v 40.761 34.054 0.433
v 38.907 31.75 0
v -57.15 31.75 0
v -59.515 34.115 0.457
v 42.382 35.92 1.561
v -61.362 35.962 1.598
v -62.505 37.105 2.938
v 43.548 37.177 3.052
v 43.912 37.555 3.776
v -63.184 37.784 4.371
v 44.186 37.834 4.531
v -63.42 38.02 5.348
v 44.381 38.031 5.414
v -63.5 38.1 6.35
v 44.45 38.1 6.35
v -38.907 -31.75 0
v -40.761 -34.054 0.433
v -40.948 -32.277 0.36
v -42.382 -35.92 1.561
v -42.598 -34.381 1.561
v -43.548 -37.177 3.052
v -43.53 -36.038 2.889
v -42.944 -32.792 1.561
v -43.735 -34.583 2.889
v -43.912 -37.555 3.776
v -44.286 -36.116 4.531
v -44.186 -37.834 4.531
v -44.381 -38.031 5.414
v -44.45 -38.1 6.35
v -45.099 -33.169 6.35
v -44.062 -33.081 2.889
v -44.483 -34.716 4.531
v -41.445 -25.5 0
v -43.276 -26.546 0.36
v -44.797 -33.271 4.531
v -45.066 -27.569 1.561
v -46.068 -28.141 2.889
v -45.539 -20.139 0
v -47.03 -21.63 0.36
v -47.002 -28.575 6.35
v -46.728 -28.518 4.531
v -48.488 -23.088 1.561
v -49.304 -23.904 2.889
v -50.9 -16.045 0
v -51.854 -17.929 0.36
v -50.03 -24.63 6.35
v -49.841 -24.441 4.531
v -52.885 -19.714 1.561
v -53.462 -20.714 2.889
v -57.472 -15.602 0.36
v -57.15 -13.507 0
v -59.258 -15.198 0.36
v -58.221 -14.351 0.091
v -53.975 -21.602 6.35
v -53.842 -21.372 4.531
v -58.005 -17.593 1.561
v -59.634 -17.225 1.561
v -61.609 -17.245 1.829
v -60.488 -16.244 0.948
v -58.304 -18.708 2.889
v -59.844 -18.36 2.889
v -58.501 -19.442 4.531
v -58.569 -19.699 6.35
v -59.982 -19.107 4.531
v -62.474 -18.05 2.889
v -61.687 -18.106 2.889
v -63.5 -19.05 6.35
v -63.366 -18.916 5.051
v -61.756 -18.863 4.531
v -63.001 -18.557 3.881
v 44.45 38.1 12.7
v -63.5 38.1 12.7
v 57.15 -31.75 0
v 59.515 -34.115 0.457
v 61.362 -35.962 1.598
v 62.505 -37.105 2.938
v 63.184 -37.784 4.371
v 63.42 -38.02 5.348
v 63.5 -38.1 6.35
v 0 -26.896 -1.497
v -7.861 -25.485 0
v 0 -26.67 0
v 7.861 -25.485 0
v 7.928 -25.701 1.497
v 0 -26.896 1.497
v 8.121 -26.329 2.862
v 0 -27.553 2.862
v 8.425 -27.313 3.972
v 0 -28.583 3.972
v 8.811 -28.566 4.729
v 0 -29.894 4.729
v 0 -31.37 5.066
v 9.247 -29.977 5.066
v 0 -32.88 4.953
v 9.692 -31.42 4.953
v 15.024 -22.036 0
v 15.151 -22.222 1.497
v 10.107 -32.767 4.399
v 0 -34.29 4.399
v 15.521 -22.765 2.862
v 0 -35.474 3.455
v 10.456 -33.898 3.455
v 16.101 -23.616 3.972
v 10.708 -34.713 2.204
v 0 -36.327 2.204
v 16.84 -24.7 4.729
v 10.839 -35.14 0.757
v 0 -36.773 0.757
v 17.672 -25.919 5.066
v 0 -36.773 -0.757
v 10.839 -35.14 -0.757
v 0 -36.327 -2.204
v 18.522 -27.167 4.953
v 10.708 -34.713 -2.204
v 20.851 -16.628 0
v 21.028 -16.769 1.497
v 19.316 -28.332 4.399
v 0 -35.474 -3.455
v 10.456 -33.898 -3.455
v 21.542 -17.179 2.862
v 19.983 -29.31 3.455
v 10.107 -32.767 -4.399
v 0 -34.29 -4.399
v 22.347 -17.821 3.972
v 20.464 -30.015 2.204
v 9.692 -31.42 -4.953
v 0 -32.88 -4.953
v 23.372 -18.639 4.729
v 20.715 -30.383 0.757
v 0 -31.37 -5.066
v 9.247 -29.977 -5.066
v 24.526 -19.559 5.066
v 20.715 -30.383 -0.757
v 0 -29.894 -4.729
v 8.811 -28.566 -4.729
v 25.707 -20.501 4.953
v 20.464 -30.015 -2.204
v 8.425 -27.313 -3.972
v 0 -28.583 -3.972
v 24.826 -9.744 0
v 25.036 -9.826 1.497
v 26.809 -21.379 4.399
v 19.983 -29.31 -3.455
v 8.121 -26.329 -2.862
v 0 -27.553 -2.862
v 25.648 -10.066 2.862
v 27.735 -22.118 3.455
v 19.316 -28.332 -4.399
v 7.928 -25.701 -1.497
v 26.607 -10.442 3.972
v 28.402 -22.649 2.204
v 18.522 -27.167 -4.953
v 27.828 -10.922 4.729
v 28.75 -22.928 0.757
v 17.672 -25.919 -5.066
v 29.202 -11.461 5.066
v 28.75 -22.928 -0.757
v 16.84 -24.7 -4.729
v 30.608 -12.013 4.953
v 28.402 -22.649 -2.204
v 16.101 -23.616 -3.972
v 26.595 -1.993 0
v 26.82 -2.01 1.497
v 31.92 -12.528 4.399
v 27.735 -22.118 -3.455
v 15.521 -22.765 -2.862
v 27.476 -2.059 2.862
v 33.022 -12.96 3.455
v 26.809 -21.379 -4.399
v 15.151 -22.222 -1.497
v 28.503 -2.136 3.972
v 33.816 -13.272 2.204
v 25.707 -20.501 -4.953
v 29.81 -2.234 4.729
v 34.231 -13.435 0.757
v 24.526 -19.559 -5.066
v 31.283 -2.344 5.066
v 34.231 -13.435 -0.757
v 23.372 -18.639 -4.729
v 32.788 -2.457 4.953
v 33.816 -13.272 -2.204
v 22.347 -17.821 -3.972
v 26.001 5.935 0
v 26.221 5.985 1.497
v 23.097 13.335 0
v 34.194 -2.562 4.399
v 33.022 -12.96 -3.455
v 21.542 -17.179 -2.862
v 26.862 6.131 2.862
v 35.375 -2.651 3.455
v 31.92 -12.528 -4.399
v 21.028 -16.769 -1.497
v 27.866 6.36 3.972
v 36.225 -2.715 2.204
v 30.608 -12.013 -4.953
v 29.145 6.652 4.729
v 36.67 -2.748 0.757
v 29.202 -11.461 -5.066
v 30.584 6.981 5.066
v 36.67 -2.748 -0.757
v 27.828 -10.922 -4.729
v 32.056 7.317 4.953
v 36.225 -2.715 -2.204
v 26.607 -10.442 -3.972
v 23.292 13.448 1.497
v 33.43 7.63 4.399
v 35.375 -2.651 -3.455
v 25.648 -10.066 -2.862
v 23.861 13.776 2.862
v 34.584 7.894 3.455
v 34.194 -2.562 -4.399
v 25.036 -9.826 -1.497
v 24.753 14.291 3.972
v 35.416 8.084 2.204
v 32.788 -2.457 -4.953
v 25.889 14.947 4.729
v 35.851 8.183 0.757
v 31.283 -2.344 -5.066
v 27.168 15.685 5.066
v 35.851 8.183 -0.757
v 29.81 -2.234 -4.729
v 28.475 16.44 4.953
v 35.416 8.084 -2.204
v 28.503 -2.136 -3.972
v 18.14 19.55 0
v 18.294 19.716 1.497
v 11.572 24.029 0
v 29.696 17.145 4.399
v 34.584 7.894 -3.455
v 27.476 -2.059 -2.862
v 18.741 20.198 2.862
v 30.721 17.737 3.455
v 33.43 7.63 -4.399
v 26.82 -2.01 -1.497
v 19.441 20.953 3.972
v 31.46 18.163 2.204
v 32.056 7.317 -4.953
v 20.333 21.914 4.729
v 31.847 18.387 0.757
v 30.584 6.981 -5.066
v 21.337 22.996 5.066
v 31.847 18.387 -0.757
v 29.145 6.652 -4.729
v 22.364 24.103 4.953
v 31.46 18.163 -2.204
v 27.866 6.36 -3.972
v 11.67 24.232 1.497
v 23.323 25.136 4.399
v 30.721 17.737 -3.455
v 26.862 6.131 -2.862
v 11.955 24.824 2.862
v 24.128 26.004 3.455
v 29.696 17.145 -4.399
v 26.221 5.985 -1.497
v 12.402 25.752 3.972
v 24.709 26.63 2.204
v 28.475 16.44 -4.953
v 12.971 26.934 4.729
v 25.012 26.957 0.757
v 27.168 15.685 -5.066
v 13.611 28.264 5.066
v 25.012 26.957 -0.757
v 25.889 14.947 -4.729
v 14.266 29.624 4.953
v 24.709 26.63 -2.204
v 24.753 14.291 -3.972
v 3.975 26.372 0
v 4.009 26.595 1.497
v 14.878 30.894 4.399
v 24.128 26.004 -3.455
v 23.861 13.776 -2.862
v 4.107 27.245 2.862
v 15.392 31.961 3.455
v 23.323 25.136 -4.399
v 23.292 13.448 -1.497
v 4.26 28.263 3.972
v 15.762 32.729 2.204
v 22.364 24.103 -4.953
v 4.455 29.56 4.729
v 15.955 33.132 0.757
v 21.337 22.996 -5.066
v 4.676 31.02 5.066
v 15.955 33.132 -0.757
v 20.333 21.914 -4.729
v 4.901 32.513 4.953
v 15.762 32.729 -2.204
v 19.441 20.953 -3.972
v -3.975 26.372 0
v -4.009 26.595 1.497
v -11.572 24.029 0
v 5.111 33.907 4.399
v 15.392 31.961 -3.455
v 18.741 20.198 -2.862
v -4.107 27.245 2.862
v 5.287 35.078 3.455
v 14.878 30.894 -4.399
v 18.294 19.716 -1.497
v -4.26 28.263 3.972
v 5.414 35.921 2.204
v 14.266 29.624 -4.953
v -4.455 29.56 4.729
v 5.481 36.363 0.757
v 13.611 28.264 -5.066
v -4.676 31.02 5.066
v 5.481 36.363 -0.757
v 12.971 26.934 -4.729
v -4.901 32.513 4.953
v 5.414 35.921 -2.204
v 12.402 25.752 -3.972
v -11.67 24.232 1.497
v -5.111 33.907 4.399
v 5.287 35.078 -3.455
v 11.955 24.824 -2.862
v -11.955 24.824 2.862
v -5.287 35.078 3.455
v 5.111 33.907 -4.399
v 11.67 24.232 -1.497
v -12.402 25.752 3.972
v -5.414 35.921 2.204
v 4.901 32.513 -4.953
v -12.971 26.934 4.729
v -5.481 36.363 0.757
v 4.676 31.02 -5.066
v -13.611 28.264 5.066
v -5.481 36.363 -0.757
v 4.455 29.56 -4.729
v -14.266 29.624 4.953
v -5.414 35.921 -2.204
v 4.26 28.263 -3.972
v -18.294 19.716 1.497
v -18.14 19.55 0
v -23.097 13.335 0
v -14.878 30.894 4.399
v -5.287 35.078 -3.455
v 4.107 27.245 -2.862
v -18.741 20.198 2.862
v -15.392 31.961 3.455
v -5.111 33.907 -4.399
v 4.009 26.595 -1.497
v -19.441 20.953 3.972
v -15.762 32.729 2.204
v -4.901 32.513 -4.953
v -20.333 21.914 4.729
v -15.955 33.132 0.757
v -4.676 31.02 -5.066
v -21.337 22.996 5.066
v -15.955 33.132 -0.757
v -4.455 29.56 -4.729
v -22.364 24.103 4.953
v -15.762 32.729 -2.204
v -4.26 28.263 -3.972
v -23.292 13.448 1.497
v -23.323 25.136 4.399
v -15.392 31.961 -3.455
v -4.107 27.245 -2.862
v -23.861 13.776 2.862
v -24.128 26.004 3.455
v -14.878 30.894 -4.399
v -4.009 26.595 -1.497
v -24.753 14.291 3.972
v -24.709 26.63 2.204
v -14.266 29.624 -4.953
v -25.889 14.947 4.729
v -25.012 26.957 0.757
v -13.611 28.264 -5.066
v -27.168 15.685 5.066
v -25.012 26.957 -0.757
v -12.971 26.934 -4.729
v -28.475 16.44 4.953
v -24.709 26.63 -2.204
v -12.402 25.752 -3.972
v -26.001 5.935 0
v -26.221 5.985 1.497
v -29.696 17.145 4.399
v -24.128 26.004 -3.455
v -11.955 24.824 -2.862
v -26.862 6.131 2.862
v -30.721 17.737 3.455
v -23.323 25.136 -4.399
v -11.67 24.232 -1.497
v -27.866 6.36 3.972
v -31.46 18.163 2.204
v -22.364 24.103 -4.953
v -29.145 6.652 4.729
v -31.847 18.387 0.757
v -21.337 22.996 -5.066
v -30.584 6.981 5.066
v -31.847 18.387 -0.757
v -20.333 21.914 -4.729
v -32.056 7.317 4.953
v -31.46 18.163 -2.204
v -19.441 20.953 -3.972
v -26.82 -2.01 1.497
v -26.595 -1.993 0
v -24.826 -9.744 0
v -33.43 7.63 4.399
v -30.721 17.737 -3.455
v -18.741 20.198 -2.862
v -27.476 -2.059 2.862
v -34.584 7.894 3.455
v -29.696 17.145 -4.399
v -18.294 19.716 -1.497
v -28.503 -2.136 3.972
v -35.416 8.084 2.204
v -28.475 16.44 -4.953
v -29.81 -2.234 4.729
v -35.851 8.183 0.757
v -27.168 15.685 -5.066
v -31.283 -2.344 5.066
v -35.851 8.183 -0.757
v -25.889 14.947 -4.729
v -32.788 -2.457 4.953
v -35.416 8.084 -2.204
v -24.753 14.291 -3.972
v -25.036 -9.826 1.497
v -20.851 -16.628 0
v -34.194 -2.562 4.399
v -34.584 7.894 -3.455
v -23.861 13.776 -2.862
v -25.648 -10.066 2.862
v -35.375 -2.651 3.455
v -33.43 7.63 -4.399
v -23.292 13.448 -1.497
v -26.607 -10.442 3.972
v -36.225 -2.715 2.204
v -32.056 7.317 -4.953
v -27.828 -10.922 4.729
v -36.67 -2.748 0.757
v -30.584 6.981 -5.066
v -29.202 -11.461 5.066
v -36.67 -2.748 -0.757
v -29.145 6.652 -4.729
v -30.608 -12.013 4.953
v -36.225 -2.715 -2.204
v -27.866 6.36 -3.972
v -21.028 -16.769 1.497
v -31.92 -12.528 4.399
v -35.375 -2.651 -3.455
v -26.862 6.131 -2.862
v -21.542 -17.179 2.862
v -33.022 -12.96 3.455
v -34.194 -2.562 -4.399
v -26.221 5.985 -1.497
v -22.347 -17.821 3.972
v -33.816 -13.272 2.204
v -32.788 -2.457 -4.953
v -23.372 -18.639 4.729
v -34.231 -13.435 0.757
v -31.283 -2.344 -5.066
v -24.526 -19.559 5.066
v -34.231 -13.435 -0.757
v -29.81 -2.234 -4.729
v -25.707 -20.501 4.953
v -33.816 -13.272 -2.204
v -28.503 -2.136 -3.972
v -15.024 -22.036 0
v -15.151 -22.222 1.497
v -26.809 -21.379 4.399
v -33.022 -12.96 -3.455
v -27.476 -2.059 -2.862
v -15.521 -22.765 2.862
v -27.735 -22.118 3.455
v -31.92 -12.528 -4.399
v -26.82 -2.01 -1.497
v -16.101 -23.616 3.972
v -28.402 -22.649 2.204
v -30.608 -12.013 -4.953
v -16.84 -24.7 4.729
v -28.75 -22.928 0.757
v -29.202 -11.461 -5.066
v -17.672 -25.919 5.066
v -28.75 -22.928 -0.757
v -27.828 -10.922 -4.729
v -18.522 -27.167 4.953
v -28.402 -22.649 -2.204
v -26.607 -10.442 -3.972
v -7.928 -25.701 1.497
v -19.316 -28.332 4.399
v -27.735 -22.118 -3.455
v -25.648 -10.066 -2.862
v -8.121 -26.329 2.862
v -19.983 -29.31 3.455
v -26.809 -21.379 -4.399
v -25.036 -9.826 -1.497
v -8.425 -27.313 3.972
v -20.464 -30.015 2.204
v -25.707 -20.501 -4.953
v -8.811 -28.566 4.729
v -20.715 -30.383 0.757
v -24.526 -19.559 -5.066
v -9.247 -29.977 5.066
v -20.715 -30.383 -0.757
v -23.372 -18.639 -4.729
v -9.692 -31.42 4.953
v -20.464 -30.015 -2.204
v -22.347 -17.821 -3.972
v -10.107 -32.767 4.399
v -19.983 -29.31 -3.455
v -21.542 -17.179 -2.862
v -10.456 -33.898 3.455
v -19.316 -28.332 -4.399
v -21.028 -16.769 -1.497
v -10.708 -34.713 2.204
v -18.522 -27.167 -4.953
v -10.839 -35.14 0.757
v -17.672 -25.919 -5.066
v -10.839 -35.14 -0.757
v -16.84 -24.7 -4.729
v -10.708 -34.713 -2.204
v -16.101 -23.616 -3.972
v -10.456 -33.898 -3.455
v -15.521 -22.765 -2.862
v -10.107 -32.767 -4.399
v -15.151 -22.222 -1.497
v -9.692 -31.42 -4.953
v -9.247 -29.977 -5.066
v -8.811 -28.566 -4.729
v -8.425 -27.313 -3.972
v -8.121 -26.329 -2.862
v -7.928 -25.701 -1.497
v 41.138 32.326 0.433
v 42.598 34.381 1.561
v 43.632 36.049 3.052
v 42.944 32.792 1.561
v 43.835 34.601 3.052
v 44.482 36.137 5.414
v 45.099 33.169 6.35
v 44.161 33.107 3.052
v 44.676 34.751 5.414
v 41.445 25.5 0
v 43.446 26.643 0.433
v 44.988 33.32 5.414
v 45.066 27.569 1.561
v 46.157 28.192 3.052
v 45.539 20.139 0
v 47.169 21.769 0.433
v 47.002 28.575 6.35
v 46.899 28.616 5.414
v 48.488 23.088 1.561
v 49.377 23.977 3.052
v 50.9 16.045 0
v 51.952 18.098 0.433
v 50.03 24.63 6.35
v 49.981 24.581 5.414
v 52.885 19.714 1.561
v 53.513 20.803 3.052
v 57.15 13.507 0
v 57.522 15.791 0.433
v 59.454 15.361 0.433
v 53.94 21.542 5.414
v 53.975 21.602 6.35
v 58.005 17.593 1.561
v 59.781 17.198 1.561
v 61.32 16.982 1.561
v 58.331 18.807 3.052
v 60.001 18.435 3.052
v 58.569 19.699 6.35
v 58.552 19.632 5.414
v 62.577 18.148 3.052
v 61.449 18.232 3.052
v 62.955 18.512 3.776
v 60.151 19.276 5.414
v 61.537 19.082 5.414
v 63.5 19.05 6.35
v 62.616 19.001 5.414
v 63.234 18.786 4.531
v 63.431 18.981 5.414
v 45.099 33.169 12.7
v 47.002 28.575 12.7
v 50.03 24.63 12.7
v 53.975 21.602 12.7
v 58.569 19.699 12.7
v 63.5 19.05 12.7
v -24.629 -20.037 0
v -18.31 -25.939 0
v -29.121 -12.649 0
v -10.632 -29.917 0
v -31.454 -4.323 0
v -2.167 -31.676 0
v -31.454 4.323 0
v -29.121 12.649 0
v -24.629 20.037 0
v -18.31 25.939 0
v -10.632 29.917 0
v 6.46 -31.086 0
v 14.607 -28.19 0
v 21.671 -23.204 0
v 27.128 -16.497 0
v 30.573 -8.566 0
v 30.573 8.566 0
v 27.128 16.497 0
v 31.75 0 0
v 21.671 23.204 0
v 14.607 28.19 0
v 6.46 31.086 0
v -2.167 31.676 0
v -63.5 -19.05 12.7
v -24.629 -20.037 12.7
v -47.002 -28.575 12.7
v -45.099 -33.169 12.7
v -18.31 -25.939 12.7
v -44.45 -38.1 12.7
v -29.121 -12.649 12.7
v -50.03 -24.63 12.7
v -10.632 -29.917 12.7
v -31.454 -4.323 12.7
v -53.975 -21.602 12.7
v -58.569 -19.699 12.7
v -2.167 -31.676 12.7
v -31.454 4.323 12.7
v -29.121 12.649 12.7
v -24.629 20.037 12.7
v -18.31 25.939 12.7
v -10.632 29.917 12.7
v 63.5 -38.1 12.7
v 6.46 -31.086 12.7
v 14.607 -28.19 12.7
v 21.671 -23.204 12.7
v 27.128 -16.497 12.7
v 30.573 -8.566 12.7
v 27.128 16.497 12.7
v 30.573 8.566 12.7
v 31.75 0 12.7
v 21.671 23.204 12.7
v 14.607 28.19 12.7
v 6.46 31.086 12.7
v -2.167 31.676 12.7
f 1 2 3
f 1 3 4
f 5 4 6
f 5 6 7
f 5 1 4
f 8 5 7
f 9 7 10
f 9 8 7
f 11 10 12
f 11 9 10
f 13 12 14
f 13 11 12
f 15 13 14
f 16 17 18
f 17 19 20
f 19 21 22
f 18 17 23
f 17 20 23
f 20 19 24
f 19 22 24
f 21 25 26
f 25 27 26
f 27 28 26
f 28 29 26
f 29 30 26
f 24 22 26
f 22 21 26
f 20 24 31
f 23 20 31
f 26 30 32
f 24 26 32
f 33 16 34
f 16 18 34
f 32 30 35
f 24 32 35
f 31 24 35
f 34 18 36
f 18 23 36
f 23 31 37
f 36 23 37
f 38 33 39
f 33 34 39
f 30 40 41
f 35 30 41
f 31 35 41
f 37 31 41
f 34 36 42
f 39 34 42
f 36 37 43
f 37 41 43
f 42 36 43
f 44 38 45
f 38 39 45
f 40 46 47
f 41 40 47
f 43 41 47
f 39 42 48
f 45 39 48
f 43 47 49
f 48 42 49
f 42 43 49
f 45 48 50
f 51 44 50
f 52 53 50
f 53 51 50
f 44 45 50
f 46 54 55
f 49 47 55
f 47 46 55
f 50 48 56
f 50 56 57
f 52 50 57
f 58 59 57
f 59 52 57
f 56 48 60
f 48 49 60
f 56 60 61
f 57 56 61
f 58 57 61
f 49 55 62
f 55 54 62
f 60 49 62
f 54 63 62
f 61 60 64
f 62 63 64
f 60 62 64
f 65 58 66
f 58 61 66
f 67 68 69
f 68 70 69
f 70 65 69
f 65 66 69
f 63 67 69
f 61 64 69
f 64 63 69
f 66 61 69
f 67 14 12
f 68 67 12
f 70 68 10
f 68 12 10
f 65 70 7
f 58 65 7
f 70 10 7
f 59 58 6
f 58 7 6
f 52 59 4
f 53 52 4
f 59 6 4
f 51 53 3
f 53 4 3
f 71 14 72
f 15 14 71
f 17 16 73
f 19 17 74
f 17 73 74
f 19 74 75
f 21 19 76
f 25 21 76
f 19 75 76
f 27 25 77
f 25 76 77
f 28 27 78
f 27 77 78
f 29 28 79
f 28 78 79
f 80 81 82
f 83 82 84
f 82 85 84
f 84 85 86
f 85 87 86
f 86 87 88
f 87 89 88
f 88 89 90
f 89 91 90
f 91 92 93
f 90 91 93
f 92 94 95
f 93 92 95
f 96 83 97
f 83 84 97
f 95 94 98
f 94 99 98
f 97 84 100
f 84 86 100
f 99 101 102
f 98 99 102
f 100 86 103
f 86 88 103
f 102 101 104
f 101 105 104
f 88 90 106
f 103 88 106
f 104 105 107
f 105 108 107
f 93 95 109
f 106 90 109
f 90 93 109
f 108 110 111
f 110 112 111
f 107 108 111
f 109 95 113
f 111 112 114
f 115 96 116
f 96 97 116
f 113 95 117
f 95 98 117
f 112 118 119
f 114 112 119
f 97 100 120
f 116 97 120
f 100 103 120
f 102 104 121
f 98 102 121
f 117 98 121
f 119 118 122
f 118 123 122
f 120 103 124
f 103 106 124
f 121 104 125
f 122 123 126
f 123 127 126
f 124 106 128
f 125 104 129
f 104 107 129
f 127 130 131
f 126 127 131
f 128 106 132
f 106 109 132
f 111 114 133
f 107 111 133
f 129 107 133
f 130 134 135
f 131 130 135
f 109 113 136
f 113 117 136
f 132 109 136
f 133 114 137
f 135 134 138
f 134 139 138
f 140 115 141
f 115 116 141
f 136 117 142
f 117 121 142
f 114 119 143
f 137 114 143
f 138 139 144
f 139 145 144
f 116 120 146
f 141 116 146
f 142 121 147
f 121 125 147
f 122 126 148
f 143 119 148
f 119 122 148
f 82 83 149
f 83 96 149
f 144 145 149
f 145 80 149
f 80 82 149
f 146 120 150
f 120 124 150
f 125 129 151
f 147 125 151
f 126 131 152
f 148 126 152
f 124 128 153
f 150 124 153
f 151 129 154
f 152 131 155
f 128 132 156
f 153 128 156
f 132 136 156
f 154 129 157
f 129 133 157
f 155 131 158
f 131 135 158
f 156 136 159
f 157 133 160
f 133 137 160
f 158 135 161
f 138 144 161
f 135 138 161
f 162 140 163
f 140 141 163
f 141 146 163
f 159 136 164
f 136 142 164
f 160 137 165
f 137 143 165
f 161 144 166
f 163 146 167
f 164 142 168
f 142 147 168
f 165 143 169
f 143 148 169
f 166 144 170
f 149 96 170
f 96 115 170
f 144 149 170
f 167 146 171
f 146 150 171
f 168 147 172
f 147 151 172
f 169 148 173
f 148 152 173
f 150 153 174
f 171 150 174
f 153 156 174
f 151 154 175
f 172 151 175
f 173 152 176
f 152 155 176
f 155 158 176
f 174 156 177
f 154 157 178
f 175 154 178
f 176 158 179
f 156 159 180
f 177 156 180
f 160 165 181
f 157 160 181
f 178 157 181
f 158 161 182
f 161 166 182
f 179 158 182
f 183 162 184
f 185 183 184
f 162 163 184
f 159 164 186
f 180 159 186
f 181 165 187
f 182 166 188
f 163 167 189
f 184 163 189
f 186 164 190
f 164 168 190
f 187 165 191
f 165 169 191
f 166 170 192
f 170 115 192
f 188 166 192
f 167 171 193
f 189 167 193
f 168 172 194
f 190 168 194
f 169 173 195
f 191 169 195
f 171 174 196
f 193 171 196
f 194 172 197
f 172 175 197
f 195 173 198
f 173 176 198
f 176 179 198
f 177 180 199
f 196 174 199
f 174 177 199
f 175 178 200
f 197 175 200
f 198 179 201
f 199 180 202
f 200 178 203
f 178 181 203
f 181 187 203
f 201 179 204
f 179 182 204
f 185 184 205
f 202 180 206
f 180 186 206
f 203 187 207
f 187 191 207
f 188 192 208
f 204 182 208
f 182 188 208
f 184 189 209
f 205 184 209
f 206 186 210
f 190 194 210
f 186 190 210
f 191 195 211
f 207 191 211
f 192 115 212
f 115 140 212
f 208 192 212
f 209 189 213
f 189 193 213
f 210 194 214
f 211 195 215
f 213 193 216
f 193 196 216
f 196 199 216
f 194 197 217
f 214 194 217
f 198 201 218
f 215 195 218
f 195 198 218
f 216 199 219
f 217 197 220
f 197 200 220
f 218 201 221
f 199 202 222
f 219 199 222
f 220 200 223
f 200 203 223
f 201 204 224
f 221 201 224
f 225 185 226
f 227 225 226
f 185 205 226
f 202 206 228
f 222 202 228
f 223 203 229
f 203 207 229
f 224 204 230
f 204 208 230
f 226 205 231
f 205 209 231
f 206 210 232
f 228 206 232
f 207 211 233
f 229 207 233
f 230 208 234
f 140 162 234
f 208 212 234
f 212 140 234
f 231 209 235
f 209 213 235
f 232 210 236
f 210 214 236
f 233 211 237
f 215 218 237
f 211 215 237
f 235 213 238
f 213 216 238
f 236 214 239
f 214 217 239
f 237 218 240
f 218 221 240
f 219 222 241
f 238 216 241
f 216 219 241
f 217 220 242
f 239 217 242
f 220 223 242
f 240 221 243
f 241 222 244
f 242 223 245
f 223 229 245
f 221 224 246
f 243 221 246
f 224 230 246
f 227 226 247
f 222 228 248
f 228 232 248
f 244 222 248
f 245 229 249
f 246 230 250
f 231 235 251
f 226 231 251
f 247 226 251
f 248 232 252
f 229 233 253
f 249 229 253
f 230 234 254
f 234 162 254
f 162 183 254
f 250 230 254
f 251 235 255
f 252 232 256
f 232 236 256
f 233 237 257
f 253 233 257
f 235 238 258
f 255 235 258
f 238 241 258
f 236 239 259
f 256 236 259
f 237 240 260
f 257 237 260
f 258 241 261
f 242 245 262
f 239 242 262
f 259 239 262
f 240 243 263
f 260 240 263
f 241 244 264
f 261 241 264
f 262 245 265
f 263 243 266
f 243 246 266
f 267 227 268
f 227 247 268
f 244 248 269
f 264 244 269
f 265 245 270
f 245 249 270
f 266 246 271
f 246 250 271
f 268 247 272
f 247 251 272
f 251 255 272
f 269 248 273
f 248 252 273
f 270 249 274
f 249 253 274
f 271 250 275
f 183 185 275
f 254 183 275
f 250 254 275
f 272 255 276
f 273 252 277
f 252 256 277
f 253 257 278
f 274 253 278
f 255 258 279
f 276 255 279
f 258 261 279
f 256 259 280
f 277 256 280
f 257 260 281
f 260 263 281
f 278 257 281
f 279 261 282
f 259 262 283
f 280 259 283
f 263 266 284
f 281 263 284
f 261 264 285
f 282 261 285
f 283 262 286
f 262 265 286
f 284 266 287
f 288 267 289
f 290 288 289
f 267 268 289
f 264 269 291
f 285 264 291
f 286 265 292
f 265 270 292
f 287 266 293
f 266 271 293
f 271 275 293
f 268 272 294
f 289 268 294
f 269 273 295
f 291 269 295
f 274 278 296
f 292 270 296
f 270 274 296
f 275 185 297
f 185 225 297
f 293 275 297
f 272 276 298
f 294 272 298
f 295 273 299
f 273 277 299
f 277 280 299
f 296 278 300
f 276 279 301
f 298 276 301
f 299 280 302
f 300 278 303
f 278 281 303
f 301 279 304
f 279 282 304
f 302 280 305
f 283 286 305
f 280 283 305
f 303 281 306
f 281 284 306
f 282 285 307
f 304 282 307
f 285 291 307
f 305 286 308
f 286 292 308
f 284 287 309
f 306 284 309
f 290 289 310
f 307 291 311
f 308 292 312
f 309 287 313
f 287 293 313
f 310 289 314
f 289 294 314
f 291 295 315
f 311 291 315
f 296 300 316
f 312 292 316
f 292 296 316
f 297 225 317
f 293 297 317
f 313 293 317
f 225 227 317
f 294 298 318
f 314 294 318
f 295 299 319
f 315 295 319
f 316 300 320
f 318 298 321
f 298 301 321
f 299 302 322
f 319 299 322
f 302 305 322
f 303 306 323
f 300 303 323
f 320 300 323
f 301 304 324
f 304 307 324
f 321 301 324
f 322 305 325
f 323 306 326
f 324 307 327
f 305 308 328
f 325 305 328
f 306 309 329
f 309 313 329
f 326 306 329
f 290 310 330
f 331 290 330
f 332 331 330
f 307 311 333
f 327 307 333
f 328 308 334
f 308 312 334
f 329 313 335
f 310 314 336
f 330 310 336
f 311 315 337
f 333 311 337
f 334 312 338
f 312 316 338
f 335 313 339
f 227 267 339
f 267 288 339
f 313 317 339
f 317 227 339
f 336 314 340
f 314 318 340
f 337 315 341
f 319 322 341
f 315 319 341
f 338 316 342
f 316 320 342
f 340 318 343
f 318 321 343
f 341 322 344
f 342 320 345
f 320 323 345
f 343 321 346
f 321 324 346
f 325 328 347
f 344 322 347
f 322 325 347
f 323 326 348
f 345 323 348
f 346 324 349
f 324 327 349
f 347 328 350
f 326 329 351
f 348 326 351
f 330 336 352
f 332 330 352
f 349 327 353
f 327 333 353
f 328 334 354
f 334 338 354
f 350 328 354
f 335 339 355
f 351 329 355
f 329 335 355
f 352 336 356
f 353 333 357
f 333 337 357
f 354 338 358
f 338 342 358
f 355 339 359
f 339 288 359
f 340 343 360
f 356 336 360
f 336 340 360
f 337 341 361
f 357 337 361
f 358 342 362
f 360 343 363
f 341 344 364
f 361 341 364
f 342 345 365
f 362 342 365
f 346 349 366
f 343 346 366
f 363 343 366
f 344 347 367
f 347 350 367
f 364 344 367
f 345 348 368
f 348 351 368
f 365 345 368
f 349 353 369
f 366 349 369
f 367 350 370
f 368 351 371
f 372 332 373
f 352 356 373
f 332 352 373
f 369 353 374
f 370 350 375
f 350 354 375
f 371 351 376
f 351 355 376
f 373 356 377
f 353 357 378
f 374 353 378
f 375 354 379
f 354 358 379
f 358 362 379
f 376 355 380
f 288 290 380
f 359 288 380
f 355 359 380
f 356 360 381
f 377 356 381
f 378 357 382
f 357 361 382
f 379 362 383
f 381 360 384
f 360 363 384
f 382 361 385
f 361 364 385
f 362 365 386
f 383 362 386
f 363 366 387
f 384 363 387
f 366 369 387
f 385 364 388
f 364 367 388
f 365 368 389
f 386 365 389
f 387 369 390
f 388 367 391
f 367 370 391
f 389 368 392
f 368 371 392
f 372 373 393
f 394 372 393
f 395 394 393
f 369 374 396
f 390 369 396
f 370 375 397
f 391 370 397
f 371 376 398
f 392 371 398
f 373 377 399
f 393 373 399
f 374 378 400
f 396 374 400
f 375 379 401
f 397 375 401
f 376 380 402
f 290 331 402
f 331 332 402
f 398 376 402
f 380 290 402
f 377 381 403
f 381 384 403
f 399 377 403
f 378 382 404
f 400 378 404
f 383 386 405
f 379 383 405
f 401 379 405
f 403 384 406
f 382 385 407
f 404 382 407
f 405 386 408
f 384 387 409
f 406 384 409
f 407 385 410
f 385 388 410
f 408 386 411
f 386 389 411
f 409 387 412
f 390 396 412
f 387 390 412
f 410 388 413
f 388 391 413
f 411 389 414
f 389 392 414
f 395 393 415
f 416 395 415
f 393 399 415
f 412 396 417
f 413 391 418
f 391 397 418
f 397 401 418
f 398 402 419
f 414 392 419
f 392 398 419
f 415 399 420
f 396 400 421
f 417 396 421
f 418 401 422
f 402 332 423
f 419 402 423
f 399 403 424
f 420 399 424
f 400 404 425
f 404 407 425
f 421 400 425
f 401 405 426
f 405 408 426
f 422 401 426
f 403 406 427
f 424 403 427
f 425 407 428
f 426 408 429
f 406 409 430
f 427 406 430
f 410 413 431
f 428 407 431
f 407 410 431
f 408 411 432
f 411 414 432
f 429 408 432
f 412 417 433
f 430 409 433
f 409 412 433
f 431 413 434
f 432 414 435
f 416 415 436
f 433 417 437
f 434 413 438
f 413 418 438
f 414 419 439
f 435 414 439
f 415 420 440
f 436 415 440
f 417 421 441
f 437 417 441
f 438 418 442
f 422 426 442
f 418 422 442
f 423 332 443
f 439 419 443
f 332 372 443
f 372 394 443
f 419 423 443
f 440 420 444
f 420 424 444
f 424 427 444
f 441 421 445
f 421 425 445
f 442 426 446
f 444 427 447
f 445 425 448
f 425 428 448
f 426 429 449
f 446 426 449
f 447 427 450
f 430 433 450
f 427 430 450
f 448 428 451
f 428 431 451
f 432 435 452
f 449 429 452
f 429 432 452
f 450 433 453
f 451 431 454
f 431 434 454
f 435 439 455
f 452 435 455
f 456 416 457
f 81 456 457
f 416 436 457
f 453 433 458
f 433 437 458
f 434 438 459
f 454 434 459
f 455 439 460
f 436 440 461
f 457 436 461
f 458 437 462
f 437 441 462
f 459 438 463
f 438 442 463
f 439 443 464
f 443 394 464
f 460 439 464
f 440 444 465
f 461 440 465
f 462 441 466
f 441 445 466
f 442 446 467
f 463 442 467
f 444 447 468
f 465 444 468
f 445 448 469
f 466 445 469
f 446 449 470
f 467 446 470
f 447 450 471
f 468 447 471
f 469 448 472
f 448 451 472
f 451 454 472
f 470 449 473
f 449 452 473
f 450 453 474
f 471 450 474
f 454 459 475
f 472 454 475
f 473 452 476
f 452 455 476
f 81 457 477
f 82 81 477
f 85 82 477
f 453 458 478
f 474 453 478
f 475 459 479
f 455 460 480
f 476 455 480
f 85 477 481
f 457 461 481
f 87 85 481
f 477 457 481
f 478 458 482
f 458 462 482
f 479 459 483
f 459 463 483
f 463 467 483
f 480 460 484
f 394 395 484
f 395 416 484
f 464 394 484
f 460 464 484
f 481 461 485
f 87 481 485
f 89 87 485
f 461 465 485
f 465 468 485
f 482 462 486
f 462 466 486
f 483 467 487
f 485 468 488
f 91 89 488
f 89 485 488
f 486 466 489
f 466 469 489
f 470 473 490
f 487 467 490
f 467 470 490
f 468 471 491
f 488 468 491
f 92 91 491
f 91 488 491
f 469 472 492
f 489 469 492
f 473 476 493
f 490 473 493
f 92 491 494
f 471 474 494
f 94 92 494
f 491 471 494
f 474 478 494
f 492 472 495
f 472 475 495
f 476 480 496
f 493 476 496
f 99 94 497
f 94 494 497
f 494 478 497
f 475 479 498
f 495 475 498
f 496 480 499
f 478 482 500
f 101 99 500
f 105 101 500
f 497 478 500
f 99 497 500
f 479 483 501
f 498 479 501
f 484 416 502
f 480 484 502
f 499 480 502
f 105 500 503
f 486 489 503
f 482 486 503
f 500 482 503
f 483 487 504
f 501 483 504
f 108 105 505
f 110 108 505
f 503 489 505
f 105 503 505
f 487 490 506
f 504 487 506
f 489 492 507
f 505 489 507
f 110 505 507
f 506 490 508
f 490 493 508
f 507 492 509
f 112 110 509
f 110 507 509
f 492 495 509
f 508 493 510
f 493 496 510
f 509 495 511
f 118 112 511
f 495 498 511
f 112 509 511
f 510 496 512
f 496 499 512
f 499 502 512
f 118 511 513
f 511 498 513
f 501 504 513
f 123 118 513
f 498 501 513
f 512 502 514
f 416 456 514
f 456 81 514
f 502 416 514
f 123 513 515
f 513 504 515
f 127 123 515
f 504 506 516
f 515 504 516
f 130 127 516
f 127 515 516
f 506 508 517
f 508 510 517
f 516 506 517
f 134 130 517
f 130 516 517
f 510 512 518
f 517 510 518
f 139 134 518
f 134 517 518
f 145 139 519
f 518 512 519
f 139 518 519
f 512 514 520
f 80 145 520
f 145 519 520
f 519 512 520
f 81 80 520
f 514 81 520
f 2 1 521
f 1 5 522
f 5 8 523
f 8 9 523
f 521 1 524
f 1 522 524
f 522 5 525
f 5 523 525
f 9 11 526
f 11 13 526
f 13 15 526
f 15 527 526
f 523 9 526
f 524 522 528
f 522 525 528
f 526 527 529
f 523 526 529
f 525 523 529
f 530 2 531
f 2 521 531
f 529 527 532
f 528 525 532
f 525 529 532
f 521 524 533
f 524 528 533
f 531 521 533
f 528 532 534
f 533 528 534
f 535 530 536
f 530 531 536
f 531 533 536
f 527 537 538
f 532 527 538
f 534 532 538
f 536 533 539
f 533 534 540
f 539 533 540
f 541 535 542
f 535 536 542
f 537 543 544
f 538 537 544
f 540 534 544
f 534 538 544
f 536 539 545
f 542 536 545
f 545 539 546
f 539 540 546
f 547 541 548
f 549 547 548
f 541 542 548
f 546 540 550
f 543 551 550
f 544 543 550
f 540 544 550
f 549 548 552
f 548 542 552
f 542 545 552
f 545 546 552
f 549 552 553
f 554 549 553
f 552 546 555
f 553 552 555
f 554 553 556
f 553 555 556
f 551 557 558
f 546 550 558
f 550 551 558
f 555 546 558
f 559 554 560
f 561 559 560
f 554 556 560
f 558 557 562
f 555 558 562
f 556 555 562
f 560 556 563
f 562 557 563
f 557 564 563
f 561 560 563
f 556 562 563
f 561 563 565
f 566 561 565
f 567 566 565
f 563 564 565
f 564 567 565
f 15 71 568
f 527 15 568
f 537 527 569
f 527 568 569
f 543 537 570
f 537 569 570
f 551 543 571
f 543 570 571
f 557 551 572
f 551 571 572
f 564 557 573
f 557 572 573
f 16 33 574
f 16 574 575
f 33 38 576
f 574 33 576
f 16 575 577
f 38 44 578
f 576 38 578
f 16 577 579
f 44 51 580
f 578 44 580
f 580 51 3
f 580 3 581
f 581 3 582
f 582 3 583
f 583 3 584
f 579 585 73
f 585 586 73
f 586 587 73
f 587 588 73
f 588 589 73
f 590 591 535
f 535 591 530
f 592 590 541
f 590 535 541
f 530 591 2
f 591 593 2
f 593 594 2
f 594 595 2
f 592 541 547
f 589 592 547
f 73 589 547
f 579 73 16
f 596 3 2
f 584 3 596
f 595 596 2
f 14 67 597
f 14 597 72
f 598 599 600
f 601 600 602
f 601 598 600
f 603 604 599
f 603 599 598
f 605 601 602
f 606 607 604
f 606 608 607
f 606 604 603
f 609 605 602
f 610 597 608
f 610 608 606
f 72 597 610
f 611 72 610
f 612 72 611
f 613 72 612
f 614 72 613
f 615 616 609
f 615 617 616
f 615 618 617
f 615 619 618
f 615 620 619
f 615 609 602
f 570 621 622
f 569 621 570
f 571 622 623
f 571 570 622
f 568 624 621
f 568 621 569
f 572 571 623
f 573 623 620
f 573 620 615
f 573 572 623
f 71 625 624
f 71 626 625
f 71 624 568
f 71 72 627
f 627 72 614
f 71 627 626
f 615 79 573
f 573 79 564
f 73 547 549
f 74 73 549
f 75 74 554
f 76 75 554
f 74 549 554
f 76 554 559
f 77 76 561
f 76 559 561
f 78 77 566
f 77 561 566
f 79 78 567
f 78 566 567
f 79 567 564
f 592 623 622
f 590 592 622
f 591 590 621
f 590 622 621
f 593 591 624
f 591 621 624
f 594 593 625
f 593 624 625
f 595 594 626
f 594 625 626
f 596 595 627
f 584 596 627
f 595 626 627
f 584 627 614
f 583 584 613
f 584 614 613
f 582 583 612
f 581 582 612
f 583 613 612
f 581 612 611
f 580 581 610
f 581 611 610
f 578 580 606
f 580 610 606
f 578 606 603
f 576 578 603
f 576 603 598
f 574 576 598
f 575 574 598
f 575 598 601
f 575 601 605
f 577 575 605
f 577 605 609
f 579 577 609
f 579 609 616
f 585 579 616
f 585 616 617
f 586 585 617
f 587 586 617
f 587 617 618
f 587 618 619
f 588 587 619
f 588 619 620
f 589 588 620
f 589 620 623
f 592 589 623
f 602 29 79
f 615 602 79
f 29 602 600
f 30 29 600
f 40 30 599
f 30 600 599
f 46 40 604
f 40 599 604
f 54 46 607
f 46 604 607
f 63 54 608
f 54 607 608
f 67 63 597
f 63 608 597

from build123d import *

# Parameters (mm, degrees)
F0_W     = 127
F0_H     = 76.2
F1_DEPTH = 12.7
F2_R     = 31.75
F3_DEPTH = 12.701
F4_R     = 5.08
F6_R     = 6.35


with BuildPart() as f1:
    # F0 (on Top) → F1 (new body)
    with BuildSketch(Plane.XY):
        Rectangle(F0_W, F0_H)
    extrude(amount=F1_DEPTH)

    # F2 (on face) → F3 (cut, through all)
    with BuildSketch(Plane.XY.offset(12.7)):
        with BuildLine():
            ThreePointArc((-44.45, -38.1), (-50.0296158184, -24.6296158184), (-63.5, -19.05))
            Line((-63.5, -19.05), (-63.5, -38.1))
            Line((-63.5, -38.1), (-44.45, -38.1))
        make_face()
        Circle(F2_R)
        with BuildLine():
            Line((63.5, 38.1), (44.45, 38.1))
            ThreePointArc((44.45, 38.1), (50.0296158184, 24.6296158184), (63.5, 19.05))
            Line((63.5, 19.05), (63.5, 38.1))
        make_face()
    extrude(amount=-F3_DEPTH, mode=Mode.SUBTRACT)

    # F6
    f6_edges = [f1.edges().sort_by_distance(p)[0] for p in [
        (9.525, -38.1, 0),
        (63.5, -9.525, 0),
        (50.029616, 24.629616, 0),
        (-9.525, 38.1, 0),
        (-63.5, 9.525, 0),
        (-50.029616, -24.629616, 0),
    ]]
    fillet(f6_edges, radius=F6_R)


with BuildPart() as f5:
    # F4 (on Right) → F5 (revolve)
    with BuildSketch(Plane.YZ):
        with Locations((-31.75, 0)):
            Circle(F4_R)
    revolve(axis=Axis((0, 0, 38.1), (0, 0, 1)))


solid = Compound([f1.part, f5.part])
